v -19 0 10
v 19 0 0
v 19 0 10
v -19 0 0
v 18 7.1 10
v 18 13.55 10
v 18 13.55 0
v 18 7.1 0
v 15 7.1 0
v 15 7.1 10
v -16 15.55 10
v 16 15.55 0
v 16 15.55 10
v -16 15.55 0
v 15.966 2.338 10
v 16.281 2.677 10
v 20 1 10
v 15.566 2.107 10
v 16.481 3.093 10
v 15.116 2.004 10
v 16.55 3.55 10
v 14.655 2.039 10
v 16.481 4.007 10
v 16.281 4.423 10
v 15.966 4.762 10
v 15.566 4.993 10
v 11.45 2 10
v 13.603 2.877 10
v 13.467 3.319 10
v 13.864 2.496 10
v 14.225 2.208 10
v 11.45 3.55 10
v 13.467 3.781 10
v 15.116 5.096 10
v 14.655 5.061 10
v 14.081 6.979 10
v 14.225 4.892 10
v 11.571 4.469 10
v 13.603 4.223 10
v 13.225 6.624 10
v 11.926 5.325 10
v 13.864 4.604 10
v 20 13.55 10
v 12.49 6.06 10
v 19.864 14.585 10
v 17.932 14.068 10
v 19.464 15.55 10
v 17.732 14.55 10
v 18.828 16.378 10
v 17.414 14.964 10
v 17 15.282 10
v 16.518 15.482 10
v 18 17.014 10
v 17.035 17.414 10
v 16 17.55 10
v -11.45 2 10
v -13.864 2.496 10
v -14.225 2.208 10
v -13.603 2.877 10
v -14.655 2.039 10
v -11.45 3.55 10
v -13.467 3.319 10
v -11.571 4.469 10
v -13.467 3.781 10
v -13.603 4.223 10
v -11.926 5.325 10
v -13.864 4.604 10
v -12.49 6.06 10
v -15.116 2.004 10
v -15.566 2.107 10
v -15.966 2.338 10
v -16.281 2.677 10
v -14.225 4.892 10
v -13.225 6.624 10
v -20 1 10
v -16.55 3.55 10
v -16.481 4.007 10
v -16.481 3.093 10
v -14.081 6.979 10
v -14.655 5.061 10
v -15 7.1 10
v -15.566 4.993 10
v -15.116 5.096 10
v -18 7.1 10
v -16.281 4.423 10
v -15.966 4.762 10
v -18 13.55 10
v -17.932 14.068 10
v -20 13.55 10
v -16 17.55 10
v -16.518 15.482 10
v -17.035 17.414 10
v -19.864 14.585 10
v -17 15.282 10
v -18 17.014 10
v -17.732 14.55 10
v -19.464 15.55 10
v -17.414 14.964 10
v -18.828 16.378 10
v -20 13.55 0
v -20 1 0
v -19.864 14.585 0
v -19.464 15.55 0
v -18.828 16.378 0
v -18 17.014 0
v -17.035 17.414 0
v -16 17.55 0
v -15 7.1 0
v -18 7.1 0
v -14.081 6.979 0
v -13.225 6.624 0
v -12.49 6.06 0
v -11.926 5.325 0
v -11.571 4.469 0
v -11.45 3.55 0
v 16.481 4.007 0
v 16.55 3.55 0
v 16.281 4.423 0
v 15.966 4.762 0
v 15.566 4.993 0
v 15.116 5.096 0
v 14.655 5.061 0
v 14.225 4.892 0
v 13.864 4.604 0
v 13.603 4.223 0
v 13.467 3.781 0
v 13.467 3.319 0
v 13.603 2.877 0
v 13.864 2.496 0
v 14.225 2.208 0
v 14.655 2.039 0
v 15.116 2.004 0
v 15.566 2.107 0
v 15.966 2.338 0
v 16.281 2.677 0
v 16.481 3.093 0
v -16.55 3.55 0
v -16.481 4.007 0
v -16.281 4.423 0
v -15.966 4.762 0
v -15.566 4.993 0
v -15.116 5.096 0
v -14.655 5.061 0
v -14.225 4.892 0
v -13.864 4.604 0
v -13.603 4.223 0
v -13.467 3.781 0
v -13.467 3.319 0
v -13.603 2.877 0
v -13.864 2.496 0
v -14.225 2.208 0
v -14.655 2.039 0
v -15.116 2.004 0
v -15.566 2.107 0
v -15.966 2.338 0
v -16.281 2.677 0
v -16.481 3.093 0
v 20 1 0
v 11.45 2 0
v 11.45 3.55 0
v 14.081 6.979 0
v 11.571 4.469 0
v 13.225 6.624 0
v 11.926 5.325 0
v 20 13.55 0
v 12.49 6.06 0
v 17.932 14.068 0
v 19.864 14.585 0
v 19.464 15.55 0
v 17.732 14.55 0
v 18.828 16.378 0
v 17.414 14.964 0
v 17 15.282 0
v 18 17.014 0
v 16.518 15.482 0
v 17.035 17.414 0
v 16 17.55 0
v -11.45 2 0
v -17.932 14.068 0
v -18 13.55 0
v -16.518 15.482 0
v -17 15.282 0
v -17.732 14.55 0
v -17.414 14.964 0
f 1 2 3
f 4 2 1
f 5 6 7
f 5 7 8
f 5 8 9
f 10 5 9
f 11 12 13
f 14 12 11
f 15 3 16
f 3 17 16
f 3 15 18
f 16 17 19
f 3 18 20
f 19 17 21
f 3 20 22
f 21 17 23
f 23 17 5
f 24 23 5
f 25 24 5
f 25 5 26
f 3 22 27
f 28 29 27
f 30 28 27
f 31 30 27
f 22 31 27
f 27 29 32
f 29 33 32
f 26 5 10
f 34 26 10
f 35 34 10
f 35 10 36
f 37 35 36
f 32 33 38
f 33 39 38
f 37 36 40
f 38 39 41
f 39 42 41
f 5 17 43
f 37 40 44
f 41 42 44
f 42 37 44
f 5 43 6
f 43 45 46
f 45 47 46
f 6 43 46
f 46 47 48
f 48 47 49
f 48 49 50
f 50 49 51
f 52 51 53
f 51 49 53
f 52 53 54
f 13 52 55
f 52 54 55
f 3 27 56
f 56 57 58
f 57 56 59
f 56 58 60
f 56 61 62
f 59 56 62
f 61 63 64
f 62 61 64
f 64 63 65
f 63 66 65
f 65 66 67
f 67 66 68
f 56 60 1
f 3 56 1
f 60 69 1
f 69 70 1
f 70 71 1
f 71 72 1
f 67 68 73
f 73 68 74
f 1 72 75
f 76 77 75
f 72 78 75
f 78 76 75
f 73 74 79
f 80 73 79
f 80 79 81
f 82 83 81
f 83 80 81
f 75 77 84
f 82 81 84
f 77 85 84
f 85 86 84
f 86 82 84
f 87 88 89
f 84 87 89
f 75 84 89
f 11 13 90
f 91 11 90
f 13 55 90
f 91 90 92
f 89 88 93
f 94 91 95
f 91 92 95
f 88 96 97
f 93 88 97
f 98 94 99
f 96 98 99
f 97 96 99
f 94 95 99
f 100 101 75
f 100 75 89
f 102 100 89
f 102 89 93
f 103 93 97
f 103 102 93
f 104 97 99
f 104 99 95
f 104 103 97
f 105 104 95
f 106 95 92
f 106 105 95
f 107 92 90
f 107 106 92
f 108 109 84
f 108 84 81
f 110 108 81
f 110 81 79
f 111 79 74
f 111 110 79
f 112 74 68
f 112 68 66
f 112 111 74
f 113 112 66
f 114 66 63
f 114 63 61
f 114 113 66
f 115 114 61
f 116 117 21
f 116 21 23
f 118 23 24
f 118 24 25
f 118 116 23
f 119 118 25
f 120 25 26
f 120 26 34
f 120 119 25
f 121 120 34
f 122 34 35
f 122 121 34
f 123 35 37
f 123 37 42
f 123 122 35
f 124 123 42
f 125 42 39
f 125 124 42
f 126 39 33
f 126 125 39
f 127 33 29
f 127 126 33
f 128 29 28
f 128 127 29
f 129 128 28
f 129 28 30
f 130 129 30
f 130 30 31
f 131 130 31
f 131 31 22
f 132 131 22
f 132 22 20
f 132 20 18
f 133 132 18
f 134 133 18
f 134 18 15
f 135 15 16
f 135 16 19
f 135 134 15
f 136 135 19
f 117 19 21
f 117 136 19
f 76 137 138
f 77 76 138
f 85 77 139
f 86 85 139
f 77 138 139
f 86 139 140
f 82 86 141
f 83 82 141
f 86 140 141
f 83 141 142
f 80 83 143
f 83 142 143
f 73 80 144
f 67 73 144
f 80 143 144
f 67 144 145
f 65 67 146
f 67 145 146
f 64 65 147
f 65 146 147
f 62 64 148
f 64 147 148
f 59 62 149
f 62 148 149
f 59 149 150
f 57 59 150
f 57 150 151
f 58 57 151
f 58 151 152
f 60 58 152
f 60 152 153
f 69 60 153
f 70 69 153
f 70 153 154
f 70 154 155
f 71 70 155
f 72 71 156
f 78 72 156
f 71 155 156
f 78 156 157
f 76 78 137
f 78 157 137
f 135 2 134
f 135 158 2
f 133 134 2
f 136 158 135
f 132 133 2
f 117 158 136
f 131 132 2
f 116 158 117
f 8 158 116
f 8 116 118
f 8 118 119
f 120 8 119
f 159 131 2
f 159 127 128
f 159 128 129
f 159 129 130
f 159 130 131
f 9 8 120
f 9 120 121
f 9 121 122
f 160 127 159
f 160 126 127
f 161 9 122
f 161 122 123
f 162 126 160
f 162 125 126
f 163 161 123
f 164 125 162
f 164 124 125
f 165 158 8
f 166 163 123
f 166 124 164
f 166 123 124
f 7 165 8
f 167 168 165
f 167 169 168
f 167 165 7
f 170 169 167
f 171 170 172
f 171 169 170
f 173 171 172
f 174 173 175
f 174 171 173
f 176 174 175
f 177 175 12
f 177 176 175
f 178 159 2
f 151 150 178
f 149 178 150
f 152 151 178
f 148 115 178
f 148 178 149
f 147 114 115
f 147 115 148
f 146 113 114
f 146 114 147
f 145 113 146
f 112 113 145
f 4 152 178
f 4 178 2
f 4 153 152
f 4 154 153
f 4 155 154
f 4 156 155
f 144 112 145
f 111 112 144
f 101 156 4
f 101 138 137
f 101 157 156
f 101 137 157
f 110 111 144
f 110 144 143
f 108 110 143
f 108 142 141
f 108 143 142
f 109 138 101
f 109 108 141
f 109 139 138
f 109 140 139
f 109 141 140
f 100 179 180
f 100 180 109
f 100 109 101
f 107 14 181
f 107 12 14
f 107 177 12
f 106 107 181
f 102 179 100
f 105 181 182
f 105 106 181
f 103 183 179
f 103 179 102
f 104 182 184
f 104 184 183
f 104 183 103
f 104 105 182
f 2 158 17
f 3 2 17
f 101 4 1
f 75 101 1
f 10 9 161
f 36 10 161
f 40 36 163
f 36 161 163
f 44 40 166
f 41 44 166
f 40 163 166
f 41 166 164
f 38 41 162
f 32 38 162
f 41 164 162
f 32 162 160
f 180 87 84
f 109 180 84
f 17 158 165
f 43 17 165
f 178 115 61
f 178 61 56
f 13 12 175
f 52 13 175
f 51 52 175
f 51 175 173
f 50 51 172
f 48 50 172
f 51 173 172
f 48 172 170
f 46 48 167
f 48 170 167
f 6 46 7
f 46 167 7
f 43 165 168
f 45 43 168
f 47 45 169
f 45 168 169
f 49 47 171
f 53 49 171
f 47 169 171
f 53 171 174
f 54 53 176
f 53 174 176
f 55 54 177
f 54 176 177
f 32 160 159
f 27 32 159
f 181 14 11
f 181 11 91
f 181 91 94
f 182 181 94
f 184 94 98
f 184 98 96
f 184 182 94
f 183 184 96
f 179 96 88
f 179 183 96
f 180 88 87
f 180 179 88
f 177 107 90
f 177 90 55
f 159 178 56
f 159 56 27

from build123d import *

# Parameters (mm, degrees)
F0_R     = 1.55
F1_DEPTH = 10
F3_SIZE  = 1


with BuildPart() as f1:
    # F0 (on Top) → F1 (new body)
    with BuildSketch(Plane.XY):
        with BuildLine():
            Line((16, 17.55), (0, 17.55))
            Line((0, 17.55), (0, 15.55))
            Line((0, 15.55), (16, 15.55))
            ThreePointArc((16, 15.55), (17.4142135624, 14.9642135624), (18, 13.55))
            Line((18, 13.55), (18, 7.1))
            Line((18, 7.1), (15, 7.1))
            ThreePointArc((15, 7.1), (12.4897709268, 6.0602290732), (11.45, 3.55))
            Line((11.45, 3.55), (11.45, 2))
            Line((11.45, 2), (0, 2))
            Line((0, 2), (0, 0))
            Line((0, 0), (20, 0))
            Line((20, 0), (20, 13.55))
            ThreePointArc((20, 13.55), (18.8284271247, 16.3784271247), (16, 17.55))
        make_face()
        with Locations((15, 3.55)):
            Circle(F0_R, mode=Mode.SUBTRACT)
    extrude(amount=F1_DEPTH)

    # F2: F1 across face


with BuildPart() as f1_1:
    add(f1.part)
    add(f1.part.mirror(Plane(origin=(0, 16.55, 5), x_dir=(0, -1, 0), z_dir=(-1, 0, 0))))

    # F3
    f3_edges = [f1_1.edges().sort_by_distance(p)[0] for p in [
        (-20, 0, 5),
        (20, 0, 5),
    ]]
    chamfer(f3_edges, length=F3_SIZE)


solid = f1_1.part
